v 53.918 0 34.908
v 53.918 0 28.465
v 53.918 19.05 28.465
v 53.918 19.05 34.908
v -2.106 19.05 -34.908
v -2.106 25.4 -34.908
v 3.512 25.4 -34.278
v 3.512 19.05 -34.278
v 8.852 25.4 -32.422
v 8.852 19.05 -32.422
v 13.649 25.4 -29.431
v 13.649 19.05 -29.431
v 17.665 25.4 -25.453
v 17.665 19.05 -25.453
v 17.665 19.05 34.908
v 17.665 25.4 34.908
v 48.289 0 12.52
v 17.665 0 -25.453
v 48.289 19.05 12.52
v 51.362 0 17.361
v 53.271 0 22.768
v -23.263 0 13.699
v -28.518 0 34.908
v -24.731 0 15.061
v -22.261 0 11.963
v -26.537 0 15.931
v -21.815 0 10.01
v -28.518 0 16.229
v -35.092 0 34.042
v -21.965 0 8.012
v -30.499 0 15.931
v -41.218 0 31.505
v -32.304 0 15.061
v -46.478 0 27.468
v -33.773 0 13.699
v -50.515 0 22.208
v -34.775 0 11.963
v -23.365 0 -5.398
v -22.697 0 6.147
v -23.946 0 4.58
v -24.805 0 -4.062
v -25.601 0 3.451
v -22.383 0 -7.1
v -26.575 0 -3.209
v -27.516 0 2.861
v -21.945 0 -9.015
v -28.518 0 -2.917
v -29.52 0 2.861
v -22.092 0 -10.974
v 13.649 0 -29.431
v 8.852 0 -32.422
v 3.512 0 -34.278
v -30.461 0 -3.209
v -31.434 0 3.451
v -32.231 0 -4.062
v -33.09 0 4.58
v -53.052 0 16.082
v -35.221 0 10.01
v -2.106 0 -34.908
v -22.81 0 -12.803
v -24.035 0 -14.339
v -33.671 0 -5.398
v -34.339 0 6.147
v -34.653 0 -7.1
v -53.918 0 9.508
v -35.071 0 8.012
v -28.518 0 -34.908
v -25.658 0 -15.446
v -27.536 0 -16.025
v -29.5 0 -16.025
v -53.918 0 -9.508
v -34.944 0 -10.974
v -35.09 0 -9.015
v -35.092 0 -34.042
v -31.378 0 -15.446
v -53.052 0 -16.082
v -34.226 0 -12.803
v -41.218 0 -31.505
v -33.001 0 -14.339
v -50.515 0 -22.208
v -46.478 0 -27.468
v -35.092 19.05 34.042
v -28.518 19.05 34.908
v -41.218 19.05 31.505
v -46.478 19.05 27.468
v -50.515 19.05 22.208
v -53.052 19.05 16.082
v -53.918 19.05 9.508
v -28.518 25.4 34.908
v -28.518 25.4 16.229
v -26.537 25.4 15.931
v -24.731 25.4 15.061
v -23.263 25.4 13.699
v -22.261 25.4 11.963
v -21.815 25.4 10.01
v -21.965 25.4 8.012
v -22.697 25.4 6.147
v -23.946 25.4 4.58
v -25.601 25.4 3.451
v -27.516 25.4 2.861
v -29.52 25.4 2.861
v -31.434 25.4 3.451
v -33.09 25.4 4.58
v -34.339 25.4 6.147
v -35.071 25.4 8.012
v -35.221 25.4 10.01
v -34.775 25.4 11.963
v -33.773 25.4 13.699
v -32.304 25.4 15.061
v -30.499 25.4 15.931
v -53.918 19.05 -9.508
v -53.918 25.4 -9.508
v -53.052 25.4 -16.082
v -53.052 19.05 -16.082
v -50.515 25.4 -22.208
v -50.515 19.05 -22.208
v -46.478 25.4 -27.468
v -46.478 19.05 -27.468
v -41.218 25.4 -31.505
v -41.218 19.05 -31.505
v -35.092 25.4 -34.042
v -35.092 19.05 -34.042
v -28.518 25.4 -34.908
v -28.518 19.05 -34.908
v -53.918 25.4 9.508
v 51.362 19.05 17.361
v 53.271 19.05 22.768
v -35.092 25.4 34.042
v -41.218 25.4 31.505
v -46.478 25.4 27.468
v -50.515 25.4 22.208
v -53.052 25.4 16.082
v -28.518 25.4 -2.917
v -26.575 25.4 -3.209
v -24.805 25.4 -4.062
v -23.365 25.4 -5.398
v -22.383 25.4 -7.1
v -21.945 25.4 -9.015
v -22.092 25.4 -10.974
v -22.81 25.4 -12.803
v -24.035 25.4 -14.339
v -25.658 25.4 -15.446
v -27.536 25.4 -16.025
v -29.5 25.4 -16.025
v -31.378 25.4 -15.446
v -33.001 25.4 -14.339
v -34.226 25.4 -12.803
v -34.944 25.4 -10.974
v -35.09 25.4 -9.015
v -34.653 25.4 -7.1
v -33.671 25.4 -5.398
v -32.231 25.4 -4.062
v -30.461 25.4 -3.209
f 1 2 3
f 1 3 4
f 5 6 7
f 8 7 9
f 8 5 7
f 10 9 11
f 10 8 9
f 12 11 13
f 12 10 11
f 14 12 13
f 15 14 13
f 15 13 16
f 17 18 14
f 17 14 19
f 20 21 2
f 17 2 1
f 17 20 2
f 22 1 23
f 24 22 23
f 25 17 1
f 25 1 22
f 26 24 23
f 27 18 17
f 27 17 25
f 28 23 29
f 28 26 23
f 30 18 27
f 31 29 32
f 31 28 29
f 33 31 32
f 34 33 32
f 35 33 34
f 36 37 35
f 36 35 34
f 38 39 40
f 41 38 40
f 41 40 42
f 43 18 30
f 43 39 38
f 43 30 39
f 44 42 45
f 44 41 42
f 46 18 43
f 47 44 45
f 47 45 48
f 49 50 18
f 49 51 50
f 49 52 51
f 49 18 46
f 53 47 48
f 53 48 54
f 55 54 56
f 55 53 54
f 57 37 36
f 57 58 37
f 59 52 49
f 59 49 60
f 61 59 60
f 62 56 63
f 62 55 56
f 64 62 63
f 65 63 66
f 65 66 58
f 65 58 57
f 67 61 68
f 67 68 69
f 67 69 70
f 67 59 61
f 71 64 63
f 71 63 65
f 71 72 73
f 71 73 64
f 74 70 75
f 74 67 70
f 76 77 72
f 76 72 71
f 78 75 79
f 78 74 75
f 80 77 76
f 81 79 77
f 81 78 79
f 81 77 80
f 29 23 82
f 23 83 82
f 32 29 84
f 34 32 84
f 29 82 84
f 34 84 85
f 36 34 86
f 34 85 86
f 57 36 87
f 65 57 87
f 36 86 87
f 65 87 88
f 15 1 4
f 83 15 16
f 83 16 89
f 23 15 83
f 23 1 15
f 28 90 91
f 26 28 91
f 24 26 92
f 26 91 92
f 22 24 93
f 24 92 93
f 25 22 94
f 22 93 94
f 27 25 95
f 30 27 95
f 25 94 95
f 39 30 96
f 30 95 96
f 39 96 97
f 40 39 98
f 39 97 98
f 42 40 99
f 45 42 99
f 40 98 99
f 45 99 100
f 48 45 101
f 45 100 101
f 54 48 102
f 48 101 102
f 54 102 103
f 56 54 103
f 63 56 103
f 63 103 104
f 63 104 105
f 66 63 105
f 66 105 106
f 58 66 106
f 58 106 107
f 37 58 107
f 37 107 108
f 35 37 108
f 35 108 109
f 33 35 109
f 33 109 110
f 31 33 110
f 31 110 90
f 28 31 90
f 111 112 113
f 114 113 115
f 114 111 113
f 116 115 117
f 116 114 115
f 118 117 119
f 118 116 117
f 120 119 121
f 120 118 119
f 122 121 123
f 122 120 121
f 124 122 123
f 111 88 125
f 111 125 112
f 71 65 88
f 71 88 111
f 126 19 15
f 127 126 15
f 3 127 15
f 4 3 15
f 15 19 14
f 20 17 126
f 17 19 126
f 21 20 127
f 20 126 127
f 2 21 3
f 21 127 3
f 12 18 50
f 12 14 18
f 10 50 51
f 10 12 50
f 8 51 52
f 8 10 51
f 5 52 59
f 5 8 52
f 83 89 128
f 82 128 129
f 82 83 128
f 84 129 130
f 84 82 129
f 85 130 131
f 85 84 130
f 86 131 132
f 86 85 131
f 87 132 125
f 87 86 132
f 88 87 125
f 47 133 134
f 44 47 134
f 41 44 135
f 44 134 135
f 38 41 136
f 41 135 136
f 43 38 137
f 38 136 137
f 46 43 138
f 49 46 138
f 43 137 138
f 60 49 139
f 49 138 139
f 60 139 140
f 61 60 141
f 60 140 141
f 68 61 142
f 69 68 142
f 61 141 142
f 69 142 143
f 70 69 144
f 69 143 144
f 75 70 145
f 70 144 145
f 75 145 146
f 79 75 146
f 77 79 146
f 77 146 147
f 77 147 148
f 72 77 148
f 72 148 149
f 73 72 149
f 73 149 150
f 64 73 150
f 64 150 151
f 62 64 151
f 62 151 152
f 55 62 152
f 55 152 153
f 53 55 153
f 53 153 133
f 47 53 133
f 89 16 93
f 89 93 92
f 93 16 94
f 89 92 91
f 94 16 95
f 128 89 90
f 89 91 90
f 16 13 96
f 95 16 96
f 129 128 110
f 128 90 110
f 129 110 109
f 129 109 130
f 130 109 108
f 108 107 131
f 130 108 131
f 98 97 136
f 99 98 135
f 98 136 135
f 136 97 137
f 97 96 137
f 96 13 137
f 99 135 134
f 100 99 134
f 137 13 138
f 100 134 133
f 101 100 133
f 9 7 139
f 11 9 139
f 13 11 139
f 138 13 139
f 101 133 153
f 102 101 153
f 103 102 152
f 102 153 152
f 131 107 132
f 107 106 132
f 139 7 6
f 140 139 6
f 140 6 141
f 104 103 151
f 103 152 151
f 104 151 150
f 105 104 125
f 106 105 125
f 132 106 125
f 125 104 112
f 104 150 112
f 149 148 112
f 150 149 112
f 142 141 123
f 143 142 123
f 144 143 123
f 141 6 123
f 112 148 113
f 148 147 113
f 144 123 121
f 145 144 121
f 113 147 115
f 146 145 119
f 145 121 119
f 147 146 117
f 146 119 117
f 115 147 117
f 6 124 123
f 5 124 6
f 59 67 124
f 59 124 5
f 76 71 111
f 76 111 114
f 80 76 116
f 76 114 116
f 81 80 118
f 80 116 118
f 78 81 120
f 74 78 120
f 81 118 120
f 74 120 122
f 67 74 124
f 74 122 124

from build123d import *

# Parameters (mm, degrees)
BOSS_EXTRUDE1_DEPTH = 19.05
FILLET1_R           = 25.4
BOSS_EXTRUDE2_DEPTH = 6.35
SKETCH4_R           = 6.721788933
SKETCH4_R_2         = 6.590945077
CUT_EXTRUDE3_DEPTH  = 26.4


with BuildPart() as part:
    # Sketch1 → Boss-Extrude1 (new body)
    with BuildSketch(Plane(origin=(0, 0, 0), x_dir=(1, 0, 0), z_dir=(0, 1, 0))):
        Polygon((10.04026689, 34.907603773), (53.917892581, -19.499033471), (53.917892581, -34.907603773), (-53.917892581, -34.907603773), (-53.917892581, 34.907603773), align=None)
    extrude(amount=BOSS_EXTRUDE1_DEPTH)

    # Fillet1
    fillet1_edges = [part.edges().sort_by_distance(p)[0] for p in [
        (-53.917892581, 9.525, -34.907603773),
        (10.04026689, 9.525, -34.907603773),
        (53.917892581, 9.525, 19.499033471),
        (-53.917892581, 9.525, 34.907603773),
    ]]
    fillet(fillet1_edges, radius=FILLET1_R)

    # Sketch3 → Boss-Extrude2 (add)
    with BuildSketch(Plane(origin=(0, 19.05, 0), x_dir=(1, 0, 0), z_dir=(0, 1, 0))):
        with BuildLine():
            Line((17.665332694, 25.452803459), (17.665332694, -34.907603773))
            Line((17.665332694, -34.907603773), (-28.517892581, -34.907603773))
            ThreePointArc((-28.517892581, -34.907603773), (-46.478404823, -27.468116015), (-53.917892581, -9.507603773))
            Line((-53.917892581, -9.507603773), (-53.917892581, 9.507603773))
            ThreePointArc((-53.917892581, 9.507603773), (-46.478404823, 27.468116015), (-28.517892581, 34.907603773))
            Line((-28.517892581, 34.907603773), (-2.106126711, 34.907603773))
            ThreePointArc((-2.106126711, 34.907603773), (8.851791157, 32.422315991), (17.665332694, 25.452803459))
        make_face()
    extrude(amount=BOSS_EXTRUDE2_DEPTH)

    # Sketch4 → Cut-Extrude3 (cut, through all)
    with BuildSketch(Plane(origin=(0, 25.4, 0), x_dir=(1, 0, 0), z_dir=(0, 1, 0))):
        with Locations(Location((-28.517892581, -9.507603773, 0), (0, 0, 270))):  # turned: the seam where the file's is
            Circle(SKETCH4_R)
        with Locations(Location((-28.517892581, 9.507603773, 0), (0, 0, 270))):  # turned: the seam where the file's is
            Circle(SKETCH4_R_2)
    extrude(amount=-CUT_EXTRUDE3_DEPTH, mode=Mode.SUBTRACT)


solid = part.part
